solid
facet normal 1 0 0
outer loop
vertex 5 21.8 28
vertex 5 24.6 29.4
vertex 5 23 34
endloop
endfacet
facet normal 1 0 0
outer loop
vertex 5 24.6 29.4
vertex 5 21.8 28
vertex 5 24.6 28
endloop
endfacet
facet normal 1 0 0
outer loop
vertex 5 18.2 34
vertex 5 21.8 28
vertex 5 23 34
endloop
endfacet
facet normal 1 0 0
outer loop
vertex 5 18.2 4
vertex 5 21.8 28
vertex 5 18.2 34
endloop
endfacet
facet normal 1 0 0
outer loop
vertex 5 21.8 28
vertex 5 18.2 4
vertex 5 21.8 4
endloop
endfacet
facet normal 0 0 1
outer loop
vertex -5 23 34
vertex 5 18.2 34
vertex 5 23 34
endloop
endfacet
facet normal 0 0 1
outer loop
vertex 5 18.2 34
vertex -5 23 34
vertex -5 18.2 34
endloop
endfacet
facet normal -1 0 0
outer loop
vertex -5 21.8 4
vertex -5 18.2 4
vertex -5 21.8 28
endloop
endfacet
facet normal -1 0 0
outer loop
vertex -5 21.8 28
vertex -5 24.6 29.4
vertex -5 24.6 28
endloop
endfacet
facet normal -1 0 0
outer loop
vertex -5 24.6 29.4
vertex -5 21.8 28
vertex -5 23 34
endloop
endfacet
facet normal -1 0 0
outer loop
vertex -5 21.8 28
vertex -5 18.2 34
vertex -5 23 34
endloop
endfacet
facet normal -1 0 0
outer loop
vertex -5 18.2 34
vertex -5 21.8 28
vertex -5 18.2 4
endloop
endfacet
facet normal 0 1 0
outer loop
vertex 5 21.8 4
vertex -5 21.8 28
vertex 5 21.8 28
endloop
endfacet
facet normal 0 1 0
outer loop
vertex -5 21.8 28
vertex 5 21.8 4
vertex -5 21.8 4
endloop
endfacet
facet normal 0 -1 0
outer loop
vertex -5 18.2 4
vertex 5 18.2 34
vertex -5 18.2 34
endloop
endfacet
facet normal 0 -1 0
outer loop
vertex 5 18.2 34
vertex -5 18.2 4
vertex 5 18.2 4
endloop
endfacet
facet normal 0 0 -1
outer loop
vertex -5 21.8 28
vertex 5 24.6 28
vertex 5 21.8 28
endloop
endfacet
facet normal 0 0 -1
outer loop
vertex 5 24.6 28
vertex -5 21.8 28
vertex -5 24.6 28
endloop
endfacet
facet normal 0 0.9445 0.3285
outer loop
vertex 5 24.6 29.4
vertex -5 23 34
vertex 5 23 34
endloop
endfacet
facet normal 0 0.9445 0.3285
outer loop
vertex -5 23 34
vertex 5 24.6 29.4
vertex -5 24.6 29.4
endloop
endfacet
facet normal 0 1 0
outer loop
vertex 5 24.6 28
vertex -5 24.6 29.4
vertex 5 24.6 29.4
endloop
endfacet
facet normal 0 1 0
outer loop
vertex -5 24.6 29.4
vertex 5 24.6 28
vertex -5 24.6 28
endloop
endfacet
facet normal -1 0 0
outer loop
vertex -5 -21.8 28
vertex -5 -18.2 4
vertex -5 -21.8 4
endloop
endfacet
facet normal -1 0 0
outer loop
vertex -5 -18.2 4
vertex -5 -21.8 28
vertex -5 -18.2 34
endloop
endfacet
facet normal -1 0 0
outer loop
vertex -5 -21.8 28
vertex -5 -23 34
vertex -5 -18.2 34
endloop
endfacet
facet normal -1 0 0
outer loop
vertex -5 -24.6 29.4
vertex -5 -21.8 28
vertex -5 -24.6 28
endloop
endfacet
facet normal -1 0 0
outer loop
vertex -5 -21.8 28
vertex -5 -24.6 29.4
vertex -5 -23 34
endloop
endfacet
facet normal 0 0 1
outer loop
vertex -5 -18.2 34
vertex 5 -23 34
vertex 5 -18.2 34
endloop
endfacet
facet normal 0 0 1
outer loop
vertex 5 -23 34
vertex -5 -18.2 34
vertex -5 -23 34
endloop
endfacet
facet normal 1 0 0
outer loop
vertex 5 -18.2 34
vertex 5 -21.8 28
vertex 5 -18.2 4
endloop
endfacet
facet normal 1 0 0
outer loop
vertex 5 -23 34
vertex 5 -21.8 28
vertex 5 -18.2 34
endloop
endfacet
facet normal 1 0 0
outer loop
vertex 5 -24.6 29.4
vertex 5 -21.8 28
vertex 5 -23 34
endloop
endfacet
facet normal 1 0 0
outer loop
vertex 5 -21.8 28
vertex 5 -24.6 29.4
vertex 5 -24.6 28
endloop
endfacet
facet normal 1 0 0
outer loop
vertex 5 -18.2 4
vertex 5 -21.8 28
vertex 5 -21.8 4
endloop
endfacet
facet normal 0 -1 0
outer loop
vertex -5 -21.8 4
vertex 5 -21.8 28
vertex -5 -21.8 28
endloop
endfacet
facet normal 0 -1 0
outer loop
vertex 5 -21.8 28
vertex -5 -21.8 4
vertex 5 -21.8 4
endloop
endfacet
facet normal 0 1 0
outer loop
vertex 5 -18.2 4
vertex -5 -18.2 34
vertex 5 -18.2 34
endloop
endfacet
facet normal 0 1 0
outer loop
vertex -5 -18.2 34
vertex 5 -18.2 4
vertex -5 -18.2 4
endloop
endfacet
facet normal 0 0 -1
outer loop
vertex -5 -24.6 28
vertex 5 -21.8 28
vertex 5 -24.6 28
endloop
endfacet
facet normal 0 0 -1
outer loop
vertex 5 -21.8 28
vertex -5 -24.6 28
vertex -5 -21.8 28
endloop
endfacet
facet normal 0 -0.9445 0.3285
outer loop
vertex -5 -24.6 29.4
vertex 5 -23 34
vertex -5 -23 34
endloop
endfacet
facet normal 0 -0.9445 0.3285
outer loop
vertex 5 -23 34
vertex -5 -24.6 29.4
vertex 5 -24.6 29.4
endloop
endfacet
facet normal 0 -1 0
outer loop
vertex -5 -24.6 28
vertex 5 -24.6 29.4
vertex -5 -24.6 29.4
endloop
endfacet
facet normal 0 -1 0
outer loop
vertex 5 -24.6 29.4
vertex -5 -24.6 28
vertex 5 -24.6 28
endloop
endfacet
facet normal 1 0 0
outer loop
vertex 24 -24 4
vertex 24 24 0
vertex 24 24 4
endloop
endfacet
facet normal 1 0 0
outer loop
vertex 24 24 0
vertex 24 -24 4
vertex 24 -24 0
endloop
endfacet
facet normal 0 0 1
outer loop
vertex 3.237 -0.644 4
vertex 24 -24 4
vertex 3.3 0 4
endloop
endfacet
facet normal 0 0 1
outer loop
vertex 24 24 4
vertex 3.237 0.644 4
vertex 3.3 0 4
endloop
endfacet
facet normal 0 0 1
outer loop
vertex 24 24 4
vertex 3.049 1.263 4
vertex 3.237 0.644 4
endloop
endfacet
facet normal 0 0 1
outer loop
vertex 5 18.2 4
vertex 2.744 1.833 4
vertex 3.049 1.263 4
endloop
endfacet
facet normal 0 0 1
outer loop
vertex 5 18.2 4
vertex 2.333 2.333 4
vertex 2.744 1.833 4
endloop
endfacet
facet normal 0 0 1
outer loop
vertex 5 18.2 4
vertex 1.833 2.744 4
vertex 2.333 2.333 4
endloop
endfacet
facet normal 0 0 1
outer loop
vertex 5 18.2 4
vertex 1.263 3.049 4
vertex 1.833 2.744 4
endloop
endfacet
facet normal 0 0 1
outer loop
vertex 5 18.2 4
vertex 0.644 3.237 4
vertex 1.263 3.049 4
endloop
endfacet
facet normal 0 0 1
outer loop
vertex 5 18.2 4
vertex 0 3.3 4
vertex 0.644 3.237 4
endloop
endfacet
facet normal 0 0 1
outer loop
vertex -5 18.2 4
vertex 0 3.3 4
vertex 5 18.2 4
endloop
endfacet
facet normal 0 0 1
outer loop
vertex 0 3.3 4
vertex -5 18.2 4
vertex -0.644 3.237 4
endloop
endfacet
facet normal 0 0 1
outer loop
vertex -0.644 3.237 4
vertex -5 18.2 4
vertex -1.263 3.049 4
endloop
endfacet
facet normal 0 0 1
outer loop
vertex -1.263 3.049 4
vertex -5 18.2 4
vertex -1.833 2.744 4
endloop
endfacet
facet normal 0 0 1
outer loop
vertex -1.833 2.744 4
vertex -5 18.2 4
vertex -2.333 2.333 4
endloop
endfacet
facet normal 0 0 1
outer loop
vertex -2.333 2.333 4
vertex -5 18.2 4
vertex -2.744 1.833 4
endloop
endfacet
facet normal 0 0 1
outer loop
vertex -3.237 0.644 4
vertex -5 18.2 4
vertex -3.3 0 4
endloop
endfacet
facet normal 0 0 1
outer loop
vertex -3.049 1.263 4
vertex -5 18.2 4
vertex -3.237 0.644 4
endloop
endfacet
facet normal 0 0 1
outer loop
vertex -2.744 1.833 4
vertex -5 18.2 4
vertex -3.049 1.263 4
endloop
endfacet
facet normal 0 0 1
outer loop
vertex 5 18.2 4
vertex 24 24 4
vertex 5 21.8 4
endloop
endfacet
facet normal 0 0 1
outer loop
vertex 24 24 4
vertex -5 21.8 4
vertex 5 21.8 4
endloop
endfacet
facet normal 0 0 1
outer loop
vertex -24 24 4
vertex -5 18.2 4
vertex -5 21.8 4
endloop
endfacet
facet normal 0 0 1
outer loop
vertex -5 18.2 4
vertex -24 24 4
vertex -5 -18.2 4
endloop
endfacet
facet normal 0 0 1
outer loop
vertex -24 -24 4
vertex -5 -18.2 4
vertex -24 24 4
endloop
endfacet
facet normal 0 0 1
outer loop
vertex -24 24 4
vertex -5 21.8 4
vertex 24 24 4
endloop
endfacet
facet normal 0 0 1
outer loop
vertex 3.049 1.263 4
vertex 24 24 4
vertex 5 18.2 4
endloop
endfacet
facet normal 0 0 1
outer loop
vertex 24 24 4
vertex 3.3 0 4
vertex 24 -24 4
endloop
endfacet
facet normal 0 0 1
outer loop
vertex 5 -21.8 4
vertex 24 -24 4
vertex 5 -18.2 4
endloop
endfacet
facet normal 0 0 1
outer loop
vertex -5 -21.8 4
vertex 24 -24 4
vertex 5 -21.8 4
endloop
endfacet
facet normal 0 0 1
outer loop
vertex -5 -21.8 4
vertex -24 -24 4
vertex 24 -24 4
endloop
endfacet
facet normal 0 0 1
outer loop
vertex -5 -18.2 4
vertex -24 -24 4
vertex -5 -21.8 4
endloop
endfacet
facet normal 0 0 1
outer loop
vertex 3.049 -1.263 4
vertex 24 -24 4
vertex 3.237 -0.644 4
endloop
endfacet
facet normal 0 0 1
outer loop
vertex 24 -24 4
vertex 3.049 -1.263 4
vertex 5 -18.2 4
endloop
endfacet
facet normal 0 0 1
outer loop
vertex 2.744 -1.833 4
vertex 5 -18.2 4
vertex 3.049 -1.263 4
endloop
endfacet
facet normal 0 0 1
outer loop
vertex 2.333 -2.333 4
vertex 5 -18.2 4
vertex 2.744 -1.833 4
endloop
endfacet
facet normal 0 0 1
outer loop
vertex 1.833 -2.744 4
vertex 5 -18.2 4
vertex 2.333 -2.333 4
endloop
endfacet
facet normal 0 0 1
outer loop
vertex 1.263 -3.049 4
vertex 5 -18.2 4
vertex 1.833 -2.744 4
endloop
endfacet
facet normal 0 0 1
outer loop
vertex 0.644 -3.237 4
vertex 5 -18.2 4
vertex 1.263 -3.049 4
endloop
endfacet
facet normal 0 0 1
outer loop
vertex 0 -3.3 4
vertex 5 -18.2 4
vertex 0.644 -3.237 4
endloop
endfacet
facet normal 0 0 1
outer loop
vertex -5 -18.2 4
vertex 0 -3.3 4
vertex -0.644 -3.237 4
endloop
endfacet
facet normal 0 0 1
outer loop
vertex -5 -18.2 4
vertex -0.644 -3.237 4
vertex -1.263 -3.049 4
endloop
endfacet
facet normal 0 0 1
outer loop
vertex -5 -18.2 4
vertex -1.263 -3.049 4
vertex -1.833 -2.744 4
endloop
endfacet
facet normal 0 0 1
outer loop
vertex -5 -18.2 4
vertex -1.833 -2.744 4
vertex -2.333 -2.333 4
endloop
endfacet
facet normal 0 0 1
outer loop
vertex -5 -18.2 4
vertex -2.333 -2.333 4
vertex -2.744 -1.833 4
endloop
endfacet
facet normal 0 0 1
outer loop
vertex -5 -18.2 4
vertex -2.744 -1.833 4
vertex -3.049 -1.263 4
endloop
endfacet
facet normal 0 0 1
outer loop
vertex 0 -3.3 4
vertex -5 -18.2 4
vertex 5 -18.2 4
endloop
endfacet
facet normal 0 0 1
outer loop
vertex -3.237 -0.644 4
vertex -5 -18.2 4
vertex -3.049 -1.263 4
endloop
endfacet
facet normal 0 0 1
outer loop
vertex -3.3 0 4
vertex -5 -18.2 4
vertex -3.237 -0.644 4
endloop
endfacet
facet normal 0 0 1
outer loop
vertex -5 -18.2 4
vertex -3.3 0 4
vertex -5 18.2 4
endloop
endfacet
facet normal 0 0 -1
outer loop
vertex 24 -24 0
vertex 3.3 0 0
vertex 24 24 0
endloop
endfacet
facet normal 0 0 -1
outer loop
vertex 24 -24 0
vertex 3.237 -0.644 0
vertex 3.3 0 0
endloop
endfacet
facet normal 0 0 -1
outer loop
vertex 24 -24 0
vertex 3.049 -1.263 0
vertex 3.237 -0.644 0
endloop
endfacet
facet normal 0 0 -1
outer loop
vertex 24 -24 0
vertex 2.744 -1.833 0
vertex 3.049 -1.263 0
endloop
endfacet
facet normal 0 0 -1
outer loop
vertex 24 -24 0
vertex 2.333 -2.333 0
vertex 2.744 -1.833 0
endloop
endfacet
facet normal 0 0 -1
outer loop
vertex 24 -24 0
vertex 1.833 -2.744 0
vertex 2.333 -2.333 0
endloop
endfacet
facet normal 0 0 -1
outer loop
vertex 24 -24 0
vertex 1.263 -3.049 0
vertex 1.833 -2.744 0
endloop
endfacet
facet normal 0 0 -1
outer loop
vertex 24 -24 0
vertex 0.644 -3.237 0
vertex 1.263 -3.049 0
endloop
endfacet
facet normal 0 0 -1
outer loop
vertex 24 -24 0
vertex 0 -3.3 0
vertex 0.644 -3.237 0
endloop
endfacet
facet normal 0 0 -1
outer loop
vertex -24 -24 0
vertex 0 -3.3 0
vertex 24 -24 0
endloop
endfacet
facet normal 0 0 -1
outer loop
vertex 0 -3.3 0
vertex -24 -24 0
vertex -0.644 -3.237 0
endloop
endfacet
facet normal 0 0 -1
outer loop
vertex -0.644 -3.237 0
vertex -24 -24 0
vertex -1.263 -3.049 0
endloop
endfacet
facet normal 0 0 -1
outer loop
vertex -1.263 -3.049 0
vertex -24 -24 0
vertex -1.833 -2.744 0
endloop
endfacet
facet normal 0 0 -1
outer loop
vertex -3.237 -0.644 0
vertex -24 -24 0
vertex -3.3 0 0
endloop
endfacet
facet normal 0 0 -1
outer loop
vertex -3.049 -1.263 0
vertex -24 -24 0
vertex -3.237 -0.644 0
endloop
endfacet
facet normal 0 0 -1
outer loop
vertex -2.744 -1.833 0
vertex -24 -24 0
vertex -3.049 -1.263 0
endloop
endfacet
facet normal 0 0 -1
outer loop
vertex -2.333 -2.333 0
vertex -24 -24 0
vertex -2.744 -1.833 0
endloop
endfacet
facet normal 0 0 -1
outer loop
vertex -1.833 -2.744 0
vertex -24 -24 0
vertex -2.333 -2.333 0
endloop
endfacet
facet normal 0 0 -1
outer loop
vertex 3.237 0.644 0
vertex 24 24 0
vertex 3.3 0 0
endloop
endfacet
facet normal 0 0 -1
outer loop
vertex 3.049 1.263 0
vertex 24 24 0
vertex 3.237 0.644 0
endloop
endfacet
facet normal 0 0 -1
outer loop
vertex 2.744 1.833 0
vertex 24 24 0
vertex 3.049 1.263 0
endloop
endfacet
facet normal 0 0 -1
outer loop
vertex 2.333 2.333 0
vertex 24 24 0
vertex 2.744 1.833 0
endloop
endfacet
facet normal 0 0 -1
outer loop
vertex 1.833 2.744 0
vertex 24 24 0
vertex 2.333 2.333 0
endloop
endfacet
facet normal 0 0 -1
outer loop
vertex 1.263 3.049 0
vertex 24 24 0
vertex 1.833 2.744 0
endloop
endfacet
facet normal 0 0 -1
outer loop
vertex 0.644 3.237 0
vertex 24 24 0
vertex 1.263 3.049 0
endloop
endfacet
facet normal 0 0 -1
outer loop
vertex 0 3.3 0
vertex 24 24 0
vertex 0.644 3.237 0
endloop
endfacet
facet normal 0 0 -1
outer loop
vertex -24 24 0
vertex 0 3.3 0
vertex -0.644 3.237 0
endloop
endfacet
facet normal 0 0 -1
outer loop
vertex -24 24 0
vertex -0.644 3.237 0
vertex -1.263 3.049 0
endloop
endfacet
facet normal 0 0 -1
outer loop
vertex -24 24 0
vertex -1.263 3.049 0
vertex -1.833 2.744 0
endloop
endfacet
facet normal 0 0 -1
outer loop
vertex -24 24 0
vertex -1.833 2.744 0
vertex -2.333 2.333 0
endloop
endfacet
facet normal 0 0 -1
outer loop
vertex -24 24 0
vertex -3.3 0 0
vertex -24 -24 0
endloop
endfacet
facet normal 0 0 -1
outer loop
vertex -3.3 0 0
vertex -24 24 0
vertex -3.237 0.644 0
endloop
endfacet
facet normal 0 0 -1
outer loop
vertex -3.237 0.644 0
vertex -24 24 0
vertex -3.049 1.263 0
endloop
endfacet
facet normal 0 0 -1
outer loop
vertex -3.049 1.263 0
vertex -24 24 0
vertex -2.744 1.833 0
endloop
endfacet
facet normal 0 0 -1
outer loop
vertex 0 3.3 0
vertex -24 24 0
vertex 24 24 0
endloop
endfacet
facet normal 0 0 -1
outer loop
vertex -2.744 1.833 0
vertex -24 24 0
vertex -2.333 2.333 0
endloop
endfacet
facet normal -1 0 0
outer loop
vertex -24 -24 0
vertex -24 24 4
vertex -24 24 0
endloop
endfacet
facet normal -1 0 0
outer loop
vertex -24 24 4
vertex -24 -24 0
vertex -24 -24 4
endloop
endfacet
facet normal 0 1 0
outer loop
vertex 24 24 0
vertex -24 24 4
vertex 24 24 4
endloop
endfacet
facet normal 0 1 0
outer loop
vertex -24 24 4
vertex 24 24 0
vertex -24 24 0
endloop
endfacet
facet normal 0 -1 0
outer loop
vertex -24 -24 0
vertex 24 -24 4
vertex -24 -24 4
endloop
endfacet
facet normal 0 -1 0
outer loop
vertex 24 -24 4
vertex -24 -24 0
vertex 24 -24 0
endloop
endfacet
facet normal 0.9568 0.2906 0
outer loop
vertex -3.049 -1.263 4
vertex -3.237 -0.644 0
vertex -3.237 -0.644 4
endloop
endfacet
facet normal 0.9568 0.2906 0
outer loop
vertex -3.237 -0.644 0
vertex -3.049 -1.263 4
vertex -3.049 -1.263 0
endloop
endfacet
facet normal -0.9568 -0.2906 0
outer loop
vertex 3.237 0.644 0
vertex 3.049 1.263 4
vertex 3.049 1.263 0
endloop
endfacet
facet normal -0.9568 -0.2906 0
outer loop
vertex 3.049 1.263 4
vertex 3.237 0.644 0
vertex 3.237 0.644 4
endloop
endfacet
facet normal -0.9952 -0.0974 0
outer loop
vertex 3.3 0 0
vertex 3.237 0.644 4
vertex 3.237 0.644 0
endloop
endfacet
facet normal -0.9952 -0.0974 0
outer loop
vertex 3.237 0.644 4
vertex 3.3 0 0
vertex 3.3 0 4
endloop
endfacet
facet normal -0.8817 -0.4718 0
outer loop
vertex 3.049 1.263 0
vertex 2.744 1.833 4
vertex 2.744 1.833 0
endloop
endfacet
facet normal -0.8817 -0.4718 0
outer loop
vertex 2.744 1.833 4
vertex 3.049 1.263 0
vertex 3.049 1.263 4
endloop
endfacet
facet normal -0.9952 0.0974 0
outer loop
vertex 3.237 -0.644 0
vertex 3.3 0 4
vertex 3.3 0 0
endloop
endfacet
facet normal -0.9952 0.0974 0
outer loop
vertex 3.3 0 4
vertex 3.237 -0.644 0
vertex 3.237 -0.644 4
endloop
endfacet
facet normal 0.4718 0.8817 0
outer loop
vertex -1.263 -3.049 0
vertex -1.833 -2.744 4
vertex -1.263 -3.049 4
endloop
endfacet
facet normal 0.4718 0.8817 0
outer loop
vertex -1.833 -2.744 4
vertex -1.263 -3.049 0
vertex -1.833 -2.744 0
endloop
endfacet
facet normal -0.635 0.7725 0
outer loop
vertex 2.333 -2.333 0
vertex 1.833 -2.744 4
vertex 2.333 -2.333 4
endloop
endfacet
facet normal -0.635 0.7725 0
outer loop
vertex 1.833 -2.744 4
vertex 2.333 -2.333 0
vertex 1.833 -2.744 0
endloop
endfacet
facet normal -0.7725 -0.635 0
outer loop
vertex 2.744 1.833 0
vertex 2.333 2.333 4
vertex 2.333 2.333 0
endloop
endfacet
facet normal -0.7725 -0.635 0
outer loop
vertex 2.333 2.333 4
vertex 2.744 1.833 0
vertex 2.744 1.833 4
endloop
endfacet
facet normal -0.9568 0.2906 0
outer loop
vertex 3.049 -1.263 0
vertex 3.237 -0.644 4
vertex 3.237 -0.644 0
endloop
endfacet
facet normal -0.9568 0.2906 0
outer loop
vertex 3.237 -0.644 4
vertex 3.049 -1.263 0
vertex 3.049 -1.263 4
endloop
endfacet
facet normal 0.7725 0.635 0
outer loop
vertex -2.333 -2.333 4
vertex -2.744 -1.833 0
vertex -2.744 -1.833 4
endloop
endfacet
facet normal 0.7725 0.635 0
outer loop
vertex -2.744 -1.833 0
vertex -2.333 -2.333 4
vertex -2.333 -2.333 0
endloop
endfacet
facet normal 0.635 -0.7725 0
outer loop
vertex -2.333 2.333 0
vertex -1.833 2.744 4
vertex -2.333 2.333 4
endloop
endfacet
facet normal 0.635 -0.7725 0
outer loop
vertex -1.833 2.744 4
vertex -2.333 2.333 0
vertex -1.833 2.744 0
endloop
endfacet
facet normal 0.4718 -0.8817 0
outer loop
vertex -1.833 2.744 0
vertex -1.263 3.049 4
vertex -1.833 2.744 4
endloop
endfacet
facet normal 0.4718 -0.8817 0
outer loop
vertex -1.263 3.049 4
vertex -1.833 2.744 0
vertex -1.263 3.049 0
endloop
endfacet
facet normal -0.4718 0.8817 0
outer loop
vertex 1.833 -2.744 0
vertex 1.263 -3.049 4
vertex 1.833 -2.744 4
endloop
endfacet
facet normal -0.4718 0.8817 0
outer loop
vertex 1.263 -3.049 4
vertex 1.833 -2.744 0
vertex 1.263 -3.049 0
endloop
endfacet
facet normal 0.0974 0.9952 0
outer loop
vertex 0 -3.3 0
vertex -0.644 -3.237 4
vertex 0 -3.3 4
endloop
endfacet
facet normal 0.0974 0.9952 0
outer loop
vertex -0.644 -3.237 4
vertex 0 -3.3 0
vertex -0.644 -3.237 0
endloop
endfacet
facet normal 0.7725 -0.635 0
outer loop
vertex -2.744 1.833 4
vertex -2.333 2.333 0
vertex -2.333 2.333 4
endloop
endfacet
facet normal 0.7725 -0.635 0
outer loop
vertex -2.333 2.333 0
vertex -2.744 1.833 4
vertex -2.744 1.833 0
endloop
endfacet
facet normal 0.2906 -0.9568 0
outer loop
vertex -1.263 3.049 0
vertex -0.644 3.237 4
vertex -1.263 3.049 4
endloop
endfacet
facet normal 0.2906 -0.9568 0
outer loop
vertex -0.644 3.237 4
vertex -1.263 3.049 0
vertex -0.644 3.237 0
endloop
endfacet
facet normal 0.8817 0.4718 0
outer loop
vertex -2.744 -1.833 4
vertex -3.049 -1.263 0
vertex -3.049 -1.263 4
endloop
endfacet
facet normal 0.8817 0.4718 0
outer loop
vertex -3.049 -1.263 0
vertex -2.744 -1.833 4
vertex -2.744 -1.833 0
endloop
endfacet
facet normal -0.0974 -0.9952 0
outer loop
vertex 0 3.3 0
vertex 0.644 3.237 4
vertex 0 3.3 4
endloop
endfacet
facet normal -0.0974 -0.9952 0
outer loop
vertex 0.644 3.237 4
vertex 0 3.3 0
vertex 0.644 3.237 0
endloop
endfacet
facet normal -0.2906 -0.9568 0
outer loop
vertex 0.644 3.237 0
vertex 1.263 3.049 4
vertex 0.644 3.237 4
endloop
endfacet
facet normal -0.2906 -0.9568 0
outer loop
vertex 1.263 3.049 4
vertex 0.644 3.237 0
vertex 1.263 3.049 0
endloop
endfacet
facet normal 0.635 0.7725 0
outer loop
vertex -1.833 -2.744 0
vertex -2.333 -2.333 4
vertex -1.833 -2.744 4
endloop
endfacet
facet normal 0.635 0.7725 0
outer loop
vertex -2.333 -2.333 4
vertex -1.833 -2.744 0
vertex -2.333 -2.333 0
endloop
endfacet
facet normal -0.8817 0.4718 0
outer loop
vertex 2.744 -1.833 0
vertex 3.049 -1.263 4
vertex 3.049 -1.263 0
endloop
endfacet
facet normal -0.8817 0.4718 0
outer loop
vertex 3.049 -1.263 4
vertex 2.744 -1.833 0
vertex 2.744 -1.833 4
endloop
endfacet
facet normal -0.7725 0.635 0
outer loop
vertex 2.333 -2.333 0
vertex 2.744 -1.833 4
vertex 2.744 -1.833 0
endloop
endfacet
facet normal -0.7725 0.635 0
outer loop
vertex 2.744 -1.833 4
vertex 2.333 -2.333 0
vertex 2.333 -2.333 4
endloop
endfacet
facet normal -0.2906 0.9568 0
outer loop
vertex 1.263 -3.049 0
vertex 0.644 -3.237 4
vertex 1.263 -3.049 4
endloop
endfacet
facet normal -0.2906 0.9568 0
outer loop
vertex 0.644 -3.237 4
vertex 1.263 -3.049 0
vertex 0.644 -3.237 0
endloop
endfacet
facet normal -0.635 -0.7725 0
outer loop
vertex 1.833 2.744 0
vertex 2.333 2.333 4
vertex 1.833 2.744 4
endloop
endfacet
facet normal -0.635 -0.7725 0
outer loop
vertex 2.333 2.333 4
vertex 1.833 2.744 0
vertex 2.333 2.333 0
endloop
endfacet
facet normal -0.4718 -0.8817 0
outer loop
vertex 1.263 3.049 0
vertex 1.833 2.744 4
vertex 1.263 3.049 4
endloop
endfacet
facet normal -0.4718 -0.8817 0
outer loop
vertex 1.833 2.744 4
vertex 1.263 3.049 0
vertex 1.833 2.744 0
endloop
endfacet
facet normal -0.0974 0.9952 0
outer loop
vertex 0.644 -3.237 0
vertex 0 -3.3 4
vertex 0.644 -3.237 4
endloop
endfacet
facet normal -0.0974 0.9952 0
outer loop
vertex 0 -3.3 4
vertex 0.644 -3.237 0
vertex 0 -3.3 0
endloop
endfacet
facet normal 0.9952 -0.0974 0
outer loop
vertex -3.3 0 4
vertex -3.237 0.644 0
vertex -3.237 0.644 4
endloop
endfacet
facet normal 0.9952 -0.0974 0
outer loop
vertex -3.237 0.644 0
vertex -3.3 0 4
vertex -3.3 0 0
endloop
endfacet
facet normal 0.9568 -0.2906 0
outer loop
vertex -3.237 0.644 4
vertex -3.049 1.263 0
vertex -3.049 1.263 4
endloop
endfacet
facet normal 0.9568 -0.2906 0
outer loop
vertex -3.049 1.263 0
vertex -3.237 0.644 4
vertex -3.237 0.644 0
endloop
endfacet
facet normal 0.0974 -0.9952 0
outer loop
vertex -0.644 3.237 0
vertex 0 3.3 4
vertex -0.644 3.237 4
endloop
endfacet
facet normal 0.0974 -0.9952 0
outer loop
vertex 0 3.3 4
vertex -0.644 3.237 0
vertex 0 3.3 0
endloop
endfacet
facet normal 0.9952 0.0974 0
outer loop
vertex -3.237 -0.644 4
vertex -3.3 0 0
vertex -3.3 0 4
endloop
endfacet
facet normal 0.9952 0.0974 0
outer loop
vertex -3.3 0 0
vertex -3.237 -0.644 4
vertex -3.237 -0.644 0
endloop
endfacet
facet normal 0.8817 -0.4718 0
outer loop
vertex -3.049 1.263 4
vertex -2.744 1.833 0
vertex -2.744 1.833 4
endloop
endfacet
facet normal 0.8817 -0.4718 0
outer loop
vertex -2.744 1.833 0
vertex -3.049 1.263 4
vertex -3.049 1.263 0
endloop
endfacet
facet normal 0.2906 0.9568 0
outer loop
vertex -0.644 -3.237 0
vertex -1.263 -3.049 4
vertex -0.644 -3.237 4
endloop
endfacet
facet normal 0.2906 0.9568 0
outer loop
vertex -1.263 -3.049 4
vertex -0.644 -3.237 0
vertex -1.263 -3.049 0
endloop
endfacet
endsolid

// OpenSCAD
$fn = 32;

// ----------------------------------------------------------------------
// Snap-fit latch: 2 arms, 30 mm tall, 3 mm undercut hooks
// ----------------------------------------------------------------------

// --- parameters (mm) ---
base_d = 48;              // base plate depth
base_h = 4;               // base plate thickness
span = 40;                // distance between opposite arms
arm_t = 3.6;              // arm thickness
arm_d = 10;               // arm width
height = 30;              // free arm length
head_len = 3;             // hook reach
head_h = 6;               // hook height
lead = 1.4;               // lead-in ramp thickness
bore_d = 6.6;             // base fixing bore
top_z = 34;               // height of the arm tips above the base

arms = 2;

difference() {
  union() {
    /* base plate, centred on the arm ring */
    translate([-24, -24, 0]) cube([base_d, base_d, base_h]);
    for (a = [0 : 360 / arms : 359]) rotate([0, 0, a]) {
    /* arm, sunk 0.5 mm into the base */
    translate([-arm_d / 2, span / 2 - arm_t / 2, base_h - 0.5]) cube([arm_d, arm_t, height + 0.5]);
    /* hook: a convex hull of a tall inner block and a thin outer lip
       gives a flat undercut below and a lead-in ramp on top */
    hull() {
      translate([-arm_d / 2, span / 2 + arm_t / 2 - 0.6, top_z - head_h]) cube([arm_d, lead + 0.4, head_h]);
      translate([-arm_d / 2, span / 2 + arm_t / 2 - 0.2, top_z - head_h]) cube([arm_d, head_len, lead]);
    }
    }
  }
  translate([0, 0, -2.5]) cylinder(h = base_h + 5, d = bore_d);
}
